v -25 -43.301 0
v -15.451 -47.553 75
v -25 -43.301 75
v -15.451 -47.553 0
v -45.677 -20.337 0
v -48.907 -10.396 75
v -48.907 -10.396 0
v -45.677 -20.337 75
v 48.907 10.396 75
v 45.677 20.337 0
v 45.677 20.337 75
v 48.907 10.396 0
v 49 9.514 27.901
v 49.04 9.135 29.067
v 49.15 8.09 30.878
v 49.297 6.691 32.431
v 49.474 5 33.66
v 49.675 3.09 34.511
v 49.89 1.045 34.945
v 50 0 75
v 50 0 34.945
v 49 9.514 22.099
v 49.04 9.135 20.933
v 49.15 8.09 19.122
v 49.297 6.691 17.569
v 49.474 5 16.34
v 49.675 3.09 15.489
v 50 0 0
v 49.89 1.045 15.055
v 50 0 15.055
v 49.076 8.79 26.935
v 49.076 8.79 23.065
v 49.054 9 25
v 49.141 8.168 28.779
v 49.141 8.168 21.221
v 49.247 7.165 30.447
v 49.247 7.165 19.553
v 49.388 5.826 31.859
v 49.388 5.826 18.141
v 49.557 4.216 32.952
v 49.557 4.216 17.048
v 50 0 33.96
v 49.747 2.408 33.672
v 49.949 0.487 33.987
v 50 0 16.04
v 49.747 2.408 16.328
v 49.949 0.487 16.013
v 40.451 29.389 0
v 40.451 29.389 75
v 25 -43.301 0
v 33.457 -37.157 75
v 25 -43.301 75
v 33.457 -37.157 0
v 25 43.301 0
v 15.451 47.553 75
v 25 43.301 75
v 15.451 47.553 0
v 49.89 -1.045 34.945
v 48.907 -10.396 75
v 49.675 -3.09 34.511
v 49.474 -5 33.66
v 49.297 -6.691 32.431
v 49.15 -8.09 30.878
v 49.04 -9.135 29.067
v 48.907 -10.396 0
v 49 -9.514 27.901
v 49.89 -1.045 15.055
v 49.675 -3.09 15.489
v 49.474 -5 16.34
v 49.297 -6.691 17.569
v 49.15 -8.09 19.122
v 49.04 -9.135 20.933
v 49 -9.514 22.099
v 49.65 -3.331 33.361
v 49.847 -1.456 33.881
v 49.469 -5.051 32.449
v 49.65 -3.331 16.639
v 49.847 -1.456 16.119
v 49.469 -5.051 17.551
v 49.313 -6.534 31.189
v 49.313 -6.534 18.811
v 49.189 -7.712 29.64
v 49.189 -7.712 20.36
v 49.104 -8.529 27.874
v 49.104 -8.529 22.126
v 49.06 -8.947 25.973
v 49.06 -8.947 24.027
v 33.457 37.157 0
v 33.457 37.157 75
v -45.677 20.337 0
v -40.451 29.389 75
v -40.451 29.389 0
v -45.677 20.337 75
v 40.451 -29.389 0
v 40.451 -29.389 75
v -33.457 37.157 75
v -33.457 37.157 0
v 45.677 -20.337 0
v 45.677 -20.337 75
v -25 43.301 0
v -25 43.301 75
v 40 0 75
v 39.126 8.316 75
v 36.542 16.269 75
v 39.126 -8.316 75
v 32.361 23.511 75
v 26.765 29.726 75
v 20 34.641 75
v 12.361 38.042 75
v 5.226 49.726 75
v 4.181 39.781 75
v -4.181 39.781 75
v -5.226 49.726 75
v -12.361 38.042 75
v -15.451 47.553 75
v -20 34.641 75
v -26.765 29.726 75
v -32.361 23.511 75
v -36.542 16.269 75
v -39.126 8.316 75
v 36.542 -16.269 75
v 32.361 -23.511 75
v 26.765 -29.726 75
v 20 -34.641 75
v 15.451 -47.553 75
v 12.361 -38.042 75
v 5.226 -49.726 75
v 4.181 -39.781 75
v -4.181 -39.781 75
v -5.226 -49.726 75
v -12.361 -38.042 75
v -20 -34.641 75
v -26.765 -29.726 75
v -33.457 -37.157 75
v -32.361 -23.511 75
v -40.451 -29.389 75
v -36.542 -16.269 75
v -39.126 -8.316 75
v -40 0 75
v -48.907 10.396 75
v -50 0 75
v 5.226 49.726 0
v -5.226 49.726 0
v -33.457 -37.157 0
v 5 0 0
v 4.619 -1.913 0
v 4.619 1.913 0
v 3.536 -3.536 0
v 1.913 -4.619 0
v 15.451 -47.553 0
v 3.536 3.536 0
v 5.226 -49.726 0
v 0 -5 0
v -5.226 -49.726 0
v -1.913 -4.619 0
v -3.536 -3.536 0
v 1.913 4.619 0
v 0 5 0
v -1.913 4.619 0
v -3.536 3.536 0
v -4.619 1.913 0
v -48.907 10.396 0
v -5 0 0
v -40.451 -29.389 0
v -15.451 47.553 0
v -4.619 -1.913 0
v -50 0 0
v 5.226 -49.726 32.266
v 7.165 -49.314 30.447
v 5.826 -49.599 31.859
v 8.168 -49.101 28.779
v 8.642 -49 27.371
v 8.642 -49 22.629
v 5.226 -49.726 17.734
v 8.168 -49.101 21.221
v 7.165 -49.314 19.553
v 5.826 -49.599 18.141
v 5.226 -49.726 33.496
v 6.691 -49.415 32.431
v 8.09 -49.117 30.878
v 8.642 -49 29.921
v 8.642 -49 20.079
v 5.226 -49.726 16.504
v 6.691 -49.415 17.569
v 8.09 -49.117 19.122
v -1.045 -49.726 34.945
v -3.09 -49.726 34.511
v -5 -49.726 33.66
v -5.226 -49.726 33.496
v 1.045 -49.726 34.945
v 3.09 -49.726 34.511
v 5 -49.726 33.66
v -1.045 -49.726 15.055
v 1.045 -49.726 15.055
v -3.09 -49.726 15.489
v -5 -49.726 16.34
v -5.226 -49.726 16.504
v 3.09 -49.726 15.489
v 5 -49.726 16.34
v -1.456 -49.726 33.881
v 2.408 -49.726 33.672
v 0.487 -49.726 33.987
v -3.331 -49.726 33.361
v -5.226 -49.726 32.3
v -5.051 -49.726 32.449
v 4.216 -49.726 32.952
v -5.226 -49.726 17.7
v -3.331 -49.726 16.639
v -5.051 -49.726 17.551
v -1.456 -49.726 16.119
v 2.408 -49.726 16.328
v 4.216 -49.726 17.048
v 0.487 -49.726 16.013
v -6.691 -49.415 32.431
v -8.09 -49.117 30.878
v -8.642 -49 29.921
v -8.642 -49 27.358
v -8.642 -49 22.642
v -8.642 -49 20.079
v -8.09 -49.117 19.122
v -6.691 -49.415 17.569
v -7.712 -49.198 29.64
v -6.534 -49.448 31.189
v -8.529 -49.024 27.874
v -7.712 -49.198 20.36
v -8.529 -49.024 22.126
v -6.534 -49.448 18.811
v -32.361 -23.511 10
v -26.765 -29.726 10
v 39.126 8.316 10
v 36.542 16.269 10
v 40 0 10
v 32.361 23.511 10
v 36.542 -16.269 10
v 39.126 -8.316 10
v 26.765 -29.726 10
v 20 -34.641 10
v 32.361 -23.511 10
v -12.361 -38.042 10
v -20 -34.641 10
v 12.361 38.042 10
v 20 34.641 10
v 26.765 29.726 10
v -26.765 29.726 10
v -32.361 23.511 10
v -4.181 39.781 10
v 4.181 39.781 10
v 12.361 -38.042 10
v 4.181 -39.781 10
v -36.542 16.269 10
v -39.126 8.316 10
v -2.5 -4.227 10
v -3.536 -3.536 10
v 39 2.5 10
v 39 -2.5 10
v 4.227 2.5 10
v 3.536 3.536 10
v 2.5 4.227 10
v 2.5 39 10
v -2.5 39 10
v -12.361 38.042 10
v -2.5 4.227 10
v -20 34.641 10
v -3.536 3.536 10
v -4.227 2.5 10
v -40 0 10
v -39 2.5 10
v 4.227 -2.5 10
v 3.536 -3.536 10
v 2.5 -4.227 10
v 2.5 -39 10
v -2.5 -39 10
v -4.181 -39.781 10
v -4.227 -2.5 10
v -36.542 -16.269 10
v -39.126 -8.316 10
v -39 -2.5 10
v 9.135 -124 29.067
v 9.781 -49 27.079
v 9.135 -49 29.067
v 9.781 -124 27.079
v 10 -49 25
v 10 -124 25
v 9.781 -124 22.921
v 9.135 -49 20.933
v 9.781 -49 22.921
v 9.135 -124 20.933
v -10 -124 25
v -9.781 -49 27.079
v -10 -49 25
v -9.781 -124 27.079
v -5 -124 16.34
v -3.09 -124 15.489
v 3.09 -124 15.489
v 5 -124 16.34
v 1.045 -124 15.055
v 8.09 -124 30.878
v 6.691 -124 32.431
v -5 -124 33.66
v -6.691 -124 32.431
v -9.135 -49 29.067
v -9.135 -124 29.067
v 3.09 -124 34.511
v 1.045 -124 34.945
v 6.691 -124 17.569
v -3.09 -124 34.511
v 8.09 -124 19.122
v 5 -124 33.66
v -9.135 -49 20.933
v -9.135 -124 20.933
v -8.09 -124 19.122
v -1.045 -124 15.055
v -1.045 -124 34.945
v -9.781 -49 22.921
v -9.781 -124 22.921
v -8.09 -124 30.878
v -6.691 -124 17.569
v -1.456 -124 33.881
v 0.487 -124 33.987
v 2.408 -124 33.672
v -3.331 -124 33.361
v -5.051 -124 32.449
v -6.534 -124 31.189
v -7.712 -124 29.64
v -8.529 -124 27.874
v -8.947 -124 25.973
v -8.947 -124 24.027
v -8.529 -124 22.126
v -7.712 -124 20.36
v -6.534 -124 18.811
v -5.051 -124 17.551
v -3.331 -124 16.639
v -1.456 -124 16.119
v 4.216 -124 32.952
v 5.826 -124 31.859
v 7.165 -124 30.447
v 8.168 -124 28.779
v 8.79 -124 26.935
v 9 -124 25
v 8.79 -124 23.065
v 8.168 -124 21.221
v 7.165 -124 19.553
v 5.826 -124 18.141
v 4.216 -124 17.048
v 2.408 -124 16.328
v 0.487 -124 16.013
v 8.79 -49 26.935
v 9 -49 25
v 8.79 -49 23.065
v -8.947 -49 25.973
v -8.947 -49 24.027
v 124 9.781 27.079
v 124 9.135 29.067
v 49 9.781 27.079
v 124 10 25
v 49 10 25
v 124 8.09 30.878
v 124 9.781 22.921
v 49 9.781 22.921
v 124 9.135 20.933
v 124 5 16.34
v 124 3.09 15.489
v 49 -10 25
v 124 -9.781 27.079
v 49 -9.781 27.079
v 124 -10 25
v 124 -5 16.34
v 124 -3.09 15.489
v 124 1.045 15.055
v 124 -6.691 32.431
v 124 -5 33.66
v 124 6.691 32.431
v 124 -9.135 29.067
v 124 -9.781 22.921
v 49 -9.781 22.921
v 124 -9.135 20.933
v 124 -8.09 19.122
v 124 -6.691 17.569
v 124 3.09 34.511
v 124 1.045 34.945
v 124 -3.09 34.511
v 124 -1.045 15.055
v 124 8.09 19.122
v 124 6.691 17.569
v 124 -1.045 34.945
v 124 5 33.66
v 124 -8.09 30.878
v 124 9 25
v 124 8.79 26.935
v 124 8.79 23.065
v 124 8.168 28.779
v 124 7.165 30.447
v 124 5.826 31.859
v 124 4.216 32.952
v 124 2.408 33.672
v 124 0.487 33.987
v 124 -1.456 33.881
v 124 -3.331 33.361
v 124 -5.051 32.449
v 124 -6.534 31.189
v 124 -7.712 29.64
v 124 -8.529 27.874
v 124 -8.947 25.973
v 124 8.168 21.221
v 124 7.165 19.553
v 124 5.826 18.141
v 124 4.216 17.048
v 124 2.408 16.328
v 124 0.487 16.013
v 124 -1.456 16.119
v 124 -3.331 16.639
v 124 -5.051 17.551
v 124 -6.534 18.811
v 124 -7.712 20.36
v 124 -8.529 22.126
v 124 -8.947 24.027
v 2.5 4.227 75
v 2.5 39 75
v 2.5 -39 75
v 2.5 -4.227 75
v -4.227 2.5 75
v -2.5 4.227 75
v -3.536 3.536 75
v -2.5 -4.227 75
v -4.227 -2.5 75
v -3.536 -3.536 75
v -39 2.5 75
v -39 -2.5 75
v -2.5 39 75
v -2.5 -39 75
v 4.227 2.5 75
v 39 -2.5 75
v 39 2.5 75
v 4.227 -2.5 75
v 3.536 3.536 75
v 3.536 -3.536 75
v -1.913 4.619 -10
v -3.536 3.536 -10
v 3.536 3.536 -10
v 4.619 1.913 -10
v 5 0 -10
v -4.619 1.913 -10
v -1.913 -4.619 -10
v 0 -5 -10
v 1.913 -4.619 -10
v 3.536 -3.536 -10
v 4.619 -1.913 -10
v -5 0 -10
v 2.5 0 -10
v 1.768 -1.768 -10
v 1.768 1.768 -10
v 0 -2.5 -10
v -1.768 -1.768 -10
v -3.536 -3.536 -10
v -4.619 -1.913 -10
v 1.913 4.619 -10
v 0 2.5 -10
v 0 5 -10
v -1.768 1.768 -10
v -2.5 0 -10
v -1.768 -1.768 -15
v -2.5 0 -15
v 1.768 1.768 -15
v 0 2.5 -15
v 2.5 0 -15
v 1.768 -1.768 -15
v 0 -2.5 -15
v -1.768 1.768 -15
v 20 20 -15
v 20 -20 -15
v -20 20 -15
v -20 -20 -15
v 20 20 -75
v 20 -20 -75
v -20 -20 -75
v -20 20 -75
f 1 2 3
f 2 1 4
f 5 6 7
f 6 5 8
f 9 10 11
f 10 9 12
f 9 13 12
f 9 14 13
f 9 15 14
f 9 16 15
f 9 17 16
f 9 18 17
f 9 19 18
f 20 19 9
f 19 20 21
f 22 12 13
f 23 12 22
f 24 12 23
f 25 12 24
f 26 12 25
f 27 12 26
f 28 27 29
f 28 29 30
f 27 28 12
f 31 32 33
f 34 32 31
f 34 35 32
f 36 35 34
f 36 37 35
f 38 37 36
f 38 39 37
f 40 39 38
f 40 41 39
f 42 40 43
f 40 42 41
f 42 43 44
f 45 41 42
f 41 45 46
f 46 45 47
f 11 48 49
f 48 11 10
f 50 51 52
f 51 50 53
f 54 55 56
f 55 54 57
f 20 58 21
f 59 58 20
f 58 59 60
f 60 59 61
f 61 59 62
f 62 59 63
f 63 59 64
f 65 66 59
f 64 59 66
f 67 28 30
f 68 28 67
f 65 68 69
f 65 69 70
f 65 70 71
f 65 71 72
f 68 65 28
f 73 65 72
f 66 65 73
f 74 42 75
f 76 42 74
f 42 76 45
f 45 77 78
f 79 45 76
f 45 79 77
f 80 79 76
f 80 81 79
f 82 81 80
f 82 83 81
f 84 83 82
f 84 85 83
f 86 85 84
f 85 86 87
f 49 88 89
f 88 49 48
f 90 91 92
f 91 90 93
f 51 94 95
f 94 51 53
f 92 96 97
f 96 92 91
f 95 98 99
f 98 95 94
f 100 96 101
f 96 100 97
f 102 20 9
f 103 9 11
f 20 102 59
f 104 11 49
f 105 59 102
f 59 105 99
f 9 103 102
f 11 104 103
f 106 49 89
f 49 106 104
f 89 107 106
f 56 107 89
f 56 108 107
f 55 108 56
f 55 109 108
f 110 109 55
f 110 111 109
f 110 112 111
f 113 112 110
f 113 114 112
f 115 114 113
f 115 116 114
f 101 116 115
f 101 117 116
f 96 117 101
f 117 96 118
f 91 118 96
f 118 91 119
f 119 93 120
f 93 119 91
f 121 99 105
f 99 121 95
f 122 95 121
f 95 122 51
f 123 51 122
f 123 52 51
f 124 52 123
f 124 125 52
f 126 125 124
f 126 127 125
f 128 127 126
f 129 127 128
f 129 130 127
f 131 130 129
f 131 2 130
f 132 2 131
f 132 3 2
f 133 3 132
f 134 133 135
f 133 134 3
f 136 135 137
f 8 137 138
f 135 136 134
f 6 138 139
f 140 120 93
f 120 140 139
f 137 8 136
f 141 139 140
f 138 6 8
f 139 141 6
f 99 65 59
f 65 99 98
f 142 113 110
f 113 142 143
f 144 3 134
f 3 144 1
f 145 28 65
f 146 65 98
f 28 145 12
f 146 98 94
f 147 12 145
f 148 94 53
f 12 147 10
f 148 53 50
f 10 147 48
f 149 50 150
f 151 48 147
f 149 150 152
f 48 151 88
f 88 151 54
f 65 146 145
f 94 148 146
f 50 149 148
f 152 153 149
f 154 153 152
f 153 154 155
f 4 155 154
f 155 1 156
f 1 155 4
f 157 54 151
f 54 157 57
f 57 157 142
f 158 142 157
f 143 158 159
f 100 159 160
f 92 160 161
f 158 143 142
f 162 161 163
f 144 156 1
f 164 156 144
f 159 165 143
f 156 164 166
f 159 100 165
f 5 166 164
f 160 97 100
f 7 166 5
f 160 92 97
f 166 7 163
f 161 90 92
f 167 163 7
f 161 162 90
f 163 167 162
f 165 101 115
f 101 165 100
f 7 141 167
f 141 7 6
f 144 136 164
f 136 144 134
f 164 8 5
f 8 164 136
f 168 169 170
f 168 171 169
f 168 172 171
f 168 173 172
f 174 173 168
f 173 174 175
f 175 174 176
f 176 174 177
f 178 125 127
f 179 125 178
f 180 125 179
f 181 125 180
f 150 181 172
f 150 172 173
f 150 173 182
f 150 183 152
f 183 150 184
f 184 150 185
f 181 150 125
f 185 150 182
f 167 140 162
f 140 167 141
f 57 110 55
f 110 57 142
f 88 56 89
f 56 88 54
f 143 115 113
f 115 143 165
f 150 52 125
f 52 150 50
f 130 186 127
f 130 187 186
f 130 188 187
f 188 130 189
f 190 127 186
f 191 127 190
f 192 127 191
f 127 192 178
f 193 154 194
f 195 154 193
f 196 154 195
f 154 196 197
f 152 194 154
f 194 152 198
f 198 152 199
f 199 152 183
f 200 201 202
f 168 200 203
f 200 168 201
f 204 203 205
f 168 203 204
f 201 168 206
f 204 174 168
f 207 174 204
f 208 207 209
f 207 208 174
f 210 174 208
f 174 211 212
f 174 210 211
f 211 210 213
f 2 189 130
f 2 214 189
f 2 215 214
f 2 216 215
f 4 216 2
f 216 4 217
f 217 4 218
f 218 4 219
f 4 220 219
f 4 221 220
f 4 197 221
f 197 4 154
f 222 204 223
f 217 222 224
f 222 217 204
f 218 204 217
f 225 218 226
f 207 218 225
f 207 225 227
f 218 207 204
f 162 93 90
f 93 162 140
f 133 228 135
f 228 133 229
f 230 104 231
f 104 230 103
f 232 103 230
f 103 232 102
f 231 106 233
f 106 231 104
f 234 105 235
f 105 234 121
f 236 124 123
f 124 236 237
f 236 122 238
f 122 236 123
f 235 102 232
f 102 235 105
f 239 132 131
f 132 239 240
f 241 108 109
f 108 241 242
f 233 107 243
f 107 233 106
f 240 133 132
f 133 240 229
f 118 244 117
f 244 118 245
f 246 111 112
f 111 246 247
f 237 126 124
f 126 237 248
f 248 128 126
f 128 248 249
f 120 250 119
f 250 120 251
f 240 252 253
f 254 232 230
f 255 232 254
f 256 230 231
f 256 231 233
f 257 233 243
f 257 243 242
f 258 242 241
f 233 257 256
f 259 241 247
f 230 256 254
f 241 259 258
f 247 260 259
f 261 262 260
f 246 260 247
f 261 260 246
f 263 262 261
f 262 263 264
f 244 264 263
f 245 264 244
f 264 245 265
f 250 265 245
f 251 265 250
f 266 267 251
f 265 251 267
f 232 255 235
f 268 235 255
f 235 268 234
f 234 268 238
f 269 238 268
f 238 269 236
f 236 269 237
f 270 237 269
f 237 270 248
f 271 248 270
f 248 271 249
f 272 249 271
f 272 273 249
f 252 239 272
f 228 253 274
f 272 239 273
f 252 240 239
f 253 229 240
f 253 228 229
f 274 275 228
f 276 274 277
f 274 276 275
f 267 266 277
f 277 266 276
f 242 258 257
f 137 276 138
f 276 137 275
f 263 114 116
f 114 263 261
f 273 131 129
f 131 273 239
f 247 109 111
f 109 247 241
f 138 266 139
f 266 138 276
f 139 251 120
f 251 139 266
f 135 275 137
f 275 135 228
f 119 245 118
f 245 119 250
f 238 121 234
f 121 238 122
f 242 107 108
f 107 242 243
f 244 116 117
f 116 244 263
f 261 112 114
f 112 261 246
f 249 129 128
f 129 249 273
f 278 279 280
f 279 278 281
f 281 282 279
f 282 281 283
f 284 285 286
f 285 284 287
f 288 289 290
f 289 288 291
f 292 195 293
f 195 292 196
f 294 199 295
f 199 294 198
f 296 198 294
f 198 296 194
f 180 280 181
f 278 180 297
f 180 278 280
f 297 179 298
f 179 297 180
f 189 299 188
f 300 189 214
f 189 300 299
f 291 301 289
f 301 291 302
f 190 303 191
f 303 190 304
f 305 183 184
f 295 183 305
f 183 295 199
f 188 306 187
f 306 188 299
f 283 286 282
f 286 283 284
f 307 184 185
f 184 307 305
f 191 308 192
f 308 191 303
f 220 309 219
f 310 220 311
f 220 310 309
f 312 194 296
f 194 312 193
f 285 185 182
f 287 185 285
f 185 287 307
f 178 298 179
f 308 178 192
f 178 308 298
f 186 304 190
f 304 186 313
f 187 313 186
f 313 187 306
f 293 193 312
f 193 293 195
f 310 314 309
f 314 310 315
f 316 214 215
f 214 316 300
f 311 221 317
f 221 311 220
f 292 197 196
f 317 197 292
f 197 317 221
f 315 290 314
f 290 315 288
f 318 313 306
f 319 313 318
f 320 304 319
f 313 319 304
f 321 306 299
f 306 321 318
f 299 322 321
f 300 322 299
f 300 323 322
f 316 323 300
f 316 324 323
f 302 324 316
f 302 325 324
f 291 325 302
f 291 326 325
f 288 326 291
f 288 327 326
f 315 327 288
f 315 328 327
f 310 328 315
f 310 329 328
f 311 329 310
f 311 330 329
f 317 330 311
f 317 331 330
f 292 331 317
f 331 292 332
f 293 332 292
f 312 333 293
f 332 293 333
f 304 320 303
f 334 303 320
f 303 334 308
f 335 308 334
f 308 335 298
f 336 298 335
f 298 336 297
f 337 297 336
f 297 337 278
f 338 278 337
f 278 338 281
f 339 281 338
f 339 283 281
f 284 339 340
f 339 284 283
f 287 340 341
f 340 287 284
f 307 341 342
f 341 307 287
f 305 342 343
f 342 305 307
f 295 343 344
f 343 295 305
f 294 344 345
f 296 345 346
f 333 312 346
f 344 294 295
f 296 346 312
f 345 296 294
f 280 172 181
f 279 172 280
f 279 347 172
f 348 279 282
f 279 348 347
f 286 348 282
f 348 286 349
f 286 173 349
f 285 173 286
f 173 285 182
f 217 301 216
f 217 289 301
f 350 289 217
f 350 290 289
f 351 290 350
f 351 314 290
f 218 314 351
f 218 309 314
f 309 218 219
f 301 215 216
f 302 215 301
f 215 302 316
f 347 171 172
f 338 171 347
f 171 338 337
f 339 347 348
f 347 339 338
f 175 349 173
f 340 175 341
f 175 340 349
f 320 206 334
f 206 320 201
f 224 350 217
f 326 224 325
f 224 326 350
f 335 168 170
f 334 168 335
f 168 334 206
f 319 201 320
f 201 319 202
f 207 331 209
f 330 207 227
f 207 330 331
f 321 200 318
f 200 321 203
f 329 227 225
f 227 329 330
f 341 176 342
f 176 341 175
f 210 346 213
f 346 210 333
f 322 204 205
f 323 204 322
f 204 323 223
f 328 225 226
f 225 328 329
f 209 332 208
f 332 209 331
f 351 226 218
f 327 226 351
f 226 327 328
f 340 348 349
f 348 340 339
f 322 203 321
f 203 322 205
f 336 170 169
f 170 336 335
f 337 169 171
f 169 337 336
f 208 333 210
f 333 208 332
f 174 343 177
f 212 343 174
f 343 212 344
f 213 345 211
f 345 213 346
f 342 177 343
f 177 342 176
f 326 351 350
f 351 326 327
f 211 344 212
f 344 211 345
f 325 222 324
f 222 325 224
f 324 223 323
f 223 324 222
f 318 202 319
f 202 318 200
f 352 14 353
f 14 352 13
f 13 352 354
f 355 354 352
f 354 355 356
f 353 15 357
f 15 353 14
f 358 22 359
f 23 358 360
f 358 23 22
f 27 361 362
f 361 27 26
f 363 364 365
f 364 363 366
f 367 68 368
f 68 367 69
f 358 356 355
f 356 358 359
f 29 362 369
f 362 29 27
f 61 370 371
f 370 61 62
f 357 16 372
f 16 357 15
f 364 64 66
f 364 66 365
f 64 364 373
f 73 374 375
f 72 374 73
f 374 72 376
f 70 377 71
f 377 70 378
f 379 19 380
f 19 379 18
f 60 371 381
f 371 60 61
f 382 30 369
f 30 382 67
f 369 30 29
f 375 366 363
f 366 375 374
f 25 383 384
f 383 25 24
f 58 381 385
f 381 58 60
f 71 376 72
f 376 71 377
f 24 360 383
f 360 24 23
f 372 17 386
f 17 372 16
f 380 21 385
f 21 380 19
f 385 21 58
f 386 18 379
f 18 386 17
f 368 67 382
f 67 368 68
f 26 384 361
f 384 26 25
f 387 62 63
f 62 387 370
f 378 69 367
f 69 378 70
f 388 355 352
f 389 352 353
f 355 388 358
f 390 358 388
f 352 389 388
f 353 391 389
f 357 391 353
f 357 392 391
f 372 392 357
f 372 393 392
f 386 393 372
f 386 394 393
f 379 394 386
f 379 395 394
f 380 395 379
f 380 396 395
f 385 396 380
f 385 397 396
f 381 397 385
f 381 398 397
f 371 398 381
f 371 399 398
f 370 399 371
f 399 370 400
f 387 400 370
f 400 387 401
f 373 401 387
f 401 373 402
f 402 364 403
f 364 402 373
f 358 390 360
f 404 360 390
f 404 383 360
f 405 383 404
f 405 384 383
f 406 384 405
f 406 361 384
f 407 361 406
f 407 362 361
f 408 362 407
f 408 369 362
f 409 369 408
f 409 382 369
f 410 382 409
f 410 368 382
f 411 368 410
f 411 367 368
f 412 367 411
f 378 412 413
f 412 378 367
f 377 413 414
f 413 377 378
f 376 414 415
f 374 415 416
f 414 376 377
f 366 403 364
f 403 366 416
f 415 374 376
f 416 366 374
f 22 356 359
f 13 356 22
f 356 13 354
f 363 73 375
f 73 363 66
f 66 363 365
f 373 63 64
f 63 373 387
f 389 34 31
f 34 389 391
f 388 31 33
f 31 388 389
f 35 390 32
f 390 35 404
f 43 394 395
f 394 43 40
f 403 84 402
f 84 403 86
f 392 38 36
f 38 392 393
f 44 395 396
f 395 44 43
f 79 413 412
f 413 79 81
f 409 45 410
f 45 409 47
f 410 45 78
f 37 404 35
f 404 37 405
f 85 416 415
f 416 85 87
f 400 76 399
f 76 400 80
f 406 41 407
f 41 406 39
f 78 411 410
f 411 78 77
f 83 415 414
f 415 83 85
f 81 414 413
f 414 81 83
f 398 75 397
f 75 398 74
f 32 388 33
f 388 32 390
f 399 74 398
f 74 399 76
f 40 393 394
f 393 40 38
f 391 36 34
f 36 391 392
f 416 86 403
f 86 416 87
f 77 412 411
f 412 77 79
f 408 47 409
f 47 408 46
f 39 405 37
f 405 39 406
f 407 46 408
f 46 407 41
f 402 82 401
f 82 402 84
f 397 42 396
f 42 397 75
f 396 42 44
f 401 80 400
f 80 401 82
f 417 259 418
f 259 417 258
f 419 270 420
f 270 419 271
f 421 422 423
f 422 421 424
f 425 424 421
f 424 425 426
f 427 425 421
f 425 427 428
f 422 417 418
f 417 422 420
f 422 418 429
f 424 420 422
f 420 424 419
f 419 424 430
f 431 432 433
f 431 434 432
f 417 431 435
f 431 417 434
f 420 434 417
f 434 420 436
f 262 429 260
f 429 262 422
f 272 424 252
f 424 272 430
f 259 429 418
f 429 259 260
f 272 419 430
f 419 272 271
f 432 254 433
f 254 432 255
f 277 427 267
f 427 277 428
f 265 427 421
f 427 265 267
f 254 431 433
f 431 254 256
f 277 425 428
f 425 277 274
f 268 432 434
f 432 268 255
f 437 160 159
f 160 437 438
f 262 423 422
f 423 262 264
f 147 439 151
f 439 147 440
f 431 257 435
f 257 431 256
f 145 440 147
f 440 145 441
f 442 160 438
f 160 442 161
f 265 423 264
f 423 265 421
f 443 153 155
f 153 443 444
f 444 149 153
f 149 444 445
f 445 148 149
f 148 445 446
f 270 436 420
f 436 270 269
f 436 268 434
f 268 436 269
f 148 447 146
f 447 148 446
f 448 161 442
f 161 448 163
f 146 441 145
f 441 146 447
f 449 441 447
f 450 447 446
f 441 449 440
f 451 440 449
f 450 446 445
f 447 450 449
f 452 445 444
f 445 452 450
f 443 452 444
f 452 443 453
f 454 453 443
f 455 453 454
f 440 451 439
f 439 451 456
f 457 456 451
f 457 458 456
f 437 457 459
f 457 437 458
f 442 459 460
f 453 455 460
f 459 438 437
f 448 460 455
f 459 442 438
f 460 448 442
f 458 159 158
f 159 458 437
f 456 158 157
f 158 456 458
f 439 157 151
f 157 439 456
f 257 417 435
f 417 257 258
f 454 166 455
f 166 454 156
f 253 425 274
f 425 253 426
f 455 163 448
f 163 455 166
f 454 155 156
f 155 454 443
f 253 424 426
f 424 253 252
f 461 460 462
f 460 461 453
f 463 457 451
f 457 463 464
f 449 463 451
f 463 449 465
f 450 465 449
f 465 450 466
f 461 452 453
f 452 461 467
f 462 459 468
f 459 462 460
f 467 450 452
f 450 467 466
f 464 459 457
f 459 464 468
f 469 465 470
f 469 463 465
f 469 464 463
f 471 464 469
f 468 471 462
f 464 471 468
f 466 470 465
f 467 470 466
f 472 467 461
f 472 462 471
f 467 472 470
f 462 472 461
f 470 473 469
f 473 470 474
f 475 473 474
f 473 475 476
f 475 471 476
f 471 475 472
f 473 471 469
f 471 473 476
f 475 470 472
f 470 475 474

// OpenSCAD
difference(){

cylinder(h=75,r=50);

translate([0,0,10])

cylinder(h=75,r=40);

}

translate([-2.5,-39,0])

cube([5,78,75]);

translate([-39,-2.5,0])

cube([78,5,75]);

translate([0,0,-10])

cylinder(h=85,r=5);

translate([0,0,-15])

cylinder(h=10,r=2.5);

translate([-20,-20,-75])

cube([40,40,60]);

difference(){

rotate([90,0,0])

translate([0,25,49])

cylinder(h=75,r=10);

rotate([90,0,0])

translate([0,25,49])

cylinder(h=75,r=9);

}

difference(){

rotate([90,0,90])

translate([0,25,49])

cylinder(h=75,r=10);

rotate([90,0,90])

translate([0,25,49])

cylinder(h=75,r=9);

}

 
